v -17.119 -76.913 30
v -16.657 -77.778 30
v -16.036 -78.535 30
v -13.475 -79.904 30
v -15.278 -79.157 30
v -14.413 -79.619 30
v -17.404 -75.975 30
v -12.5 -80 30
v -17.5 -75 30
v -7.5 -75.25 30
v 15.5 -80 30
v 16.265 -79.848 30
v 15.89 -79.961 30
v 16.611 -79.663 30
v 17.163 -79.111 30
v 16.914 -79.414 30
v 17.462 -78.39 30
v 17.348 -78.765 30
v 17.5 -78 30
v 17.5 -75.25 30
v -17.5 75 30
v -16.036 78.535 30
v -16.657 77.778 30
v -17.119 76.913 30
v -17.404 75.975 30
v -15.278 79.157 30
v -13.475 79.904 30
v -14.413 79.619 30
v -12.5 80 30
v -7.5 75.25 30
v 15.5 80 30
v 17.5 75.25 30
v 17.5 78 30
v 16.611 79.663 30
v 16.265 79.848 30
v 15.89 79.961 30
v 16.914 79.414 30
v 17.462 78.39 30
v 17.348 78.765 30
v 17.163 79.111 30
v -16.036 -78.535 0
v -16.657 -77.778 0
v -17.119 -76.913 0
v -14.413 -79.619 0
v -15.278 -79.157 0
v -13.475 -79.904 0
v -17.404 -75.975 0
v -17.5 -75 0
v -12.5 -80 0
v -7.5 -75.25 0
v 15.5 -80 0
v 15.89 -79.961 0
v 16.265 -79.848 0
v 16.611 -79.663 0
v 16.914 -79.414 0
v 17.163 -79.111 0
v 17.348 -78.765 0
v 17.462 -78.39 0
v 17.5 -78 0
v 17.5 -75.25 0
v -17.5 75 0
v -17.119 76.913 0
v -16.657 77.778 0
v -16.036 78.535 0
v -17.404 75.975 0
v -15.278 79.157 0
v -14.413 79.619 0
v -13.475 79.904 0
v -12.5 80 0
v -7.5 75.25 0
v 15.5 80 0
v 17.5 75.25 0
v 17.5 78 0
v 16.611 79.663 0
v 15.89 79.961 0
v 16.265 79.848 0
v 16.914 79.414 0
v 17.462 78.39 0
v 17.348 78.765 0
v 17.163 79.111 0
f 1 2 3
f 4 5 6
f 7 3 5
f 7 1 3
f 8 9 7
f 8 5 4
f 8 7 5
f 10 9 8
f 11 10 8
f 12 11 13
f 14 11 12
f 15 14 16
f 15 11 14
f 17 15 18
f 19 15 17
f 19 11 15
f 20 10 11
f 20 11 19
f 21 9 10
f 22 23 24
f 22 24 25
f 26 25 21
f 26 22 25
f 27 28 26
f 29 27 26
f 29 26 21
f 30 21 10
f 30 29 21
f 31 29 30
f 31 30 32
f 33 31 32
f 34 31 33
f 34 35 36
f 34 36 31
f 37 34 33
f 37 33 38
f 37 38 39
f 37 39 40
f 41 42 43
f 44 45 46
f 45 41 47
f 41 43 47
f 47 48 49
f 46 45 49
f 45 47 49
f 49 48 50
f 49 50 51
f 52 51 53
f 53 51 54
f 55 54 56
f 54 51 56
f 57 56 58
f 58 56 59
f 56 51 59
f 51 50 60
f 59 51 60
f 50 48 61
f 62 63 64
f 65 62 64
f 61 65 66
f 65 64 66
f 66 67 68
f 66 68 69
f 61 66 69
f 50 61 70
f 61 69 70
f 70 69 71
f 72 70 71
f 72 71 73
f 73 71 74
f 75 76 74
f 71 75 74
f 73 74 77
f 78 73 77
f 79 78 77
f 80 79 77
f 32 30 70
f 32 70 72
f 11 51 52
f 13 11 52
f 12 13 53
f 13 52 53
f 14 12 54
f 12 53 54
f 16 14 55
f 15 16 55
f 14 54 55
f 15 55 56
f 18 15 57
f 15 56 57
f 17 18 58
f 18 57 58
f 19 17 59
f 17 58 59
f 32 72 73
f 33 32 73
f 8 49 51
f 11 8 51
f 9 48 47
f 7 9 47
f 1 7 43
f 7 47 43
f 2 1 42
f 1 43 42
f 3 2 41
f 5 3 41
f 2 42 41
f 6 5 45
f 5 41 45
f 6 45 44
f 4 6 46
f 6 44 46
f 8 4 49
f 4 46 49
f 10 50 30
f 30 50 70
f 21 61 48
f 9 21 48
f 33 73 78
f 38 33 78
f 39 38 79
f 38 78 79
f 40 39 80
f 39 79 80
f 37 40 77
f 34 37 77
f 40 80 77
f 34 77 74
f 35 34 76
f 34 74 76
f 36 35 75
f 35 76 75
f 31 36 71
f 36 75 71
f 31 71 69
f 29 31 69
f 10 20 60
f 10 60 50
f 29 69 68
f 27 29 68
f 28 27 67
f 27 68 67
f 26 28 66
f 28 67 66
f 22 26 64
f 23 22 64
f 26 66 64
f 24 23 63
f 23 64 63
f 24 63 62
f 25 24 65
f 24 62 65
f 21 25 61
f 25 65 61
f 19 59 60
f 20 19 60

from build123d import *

# Parameters (mm, degrees)
BOSS_EXTRUDE1_DEPTH = 30


with BuildPart() as part:
    # Sketch1 → Boss-Extrude1 (new body)
    with BuildSketch(Plane.XY):
        with BuildLine():
            Line((-17.5, 74.999850335), (-17.5, -74.999850335))
            ThreePointArc((-17.5, -74.999850335), (-16.035533906, -78.535384241), (-12.5, -79.999850335))
            Line((-12.5, -79.999850335), (15.5, -79.999850335))
            ThreePointArc((15.5, -79.999850335), (16.914213562, -79.414063897), (17.5, -77.999850335))
            Line((17.5, -77.999850335), (17.5, -75.249850335))
            Line((17.5, -75.249850335), (-7.5, -75.249850335))
            Line((-7.5, -75.249850335), (-7.5, 75.250149665))
            Line((-7.5, 75.250149665), (17.5, 75.250149665))
            Line((17.5, 75.250149665), (17.5, 77.999850335))
            ThreePointArc((17.5, 77.999850335), (16.914213562, 79.414063897), (15.5, 79.999850335))
            Line((15.5, 79.999850335), (-12.5, 79.999850335))
            ThreePointArc((-12.5, 79.999850335), (-16.035533906, 78.535384241), (-17.5, 74.999850335))
        make_face()
    extrude(amount=BOSS_EXTRUDE1_DEPTH)


solid = part.part
